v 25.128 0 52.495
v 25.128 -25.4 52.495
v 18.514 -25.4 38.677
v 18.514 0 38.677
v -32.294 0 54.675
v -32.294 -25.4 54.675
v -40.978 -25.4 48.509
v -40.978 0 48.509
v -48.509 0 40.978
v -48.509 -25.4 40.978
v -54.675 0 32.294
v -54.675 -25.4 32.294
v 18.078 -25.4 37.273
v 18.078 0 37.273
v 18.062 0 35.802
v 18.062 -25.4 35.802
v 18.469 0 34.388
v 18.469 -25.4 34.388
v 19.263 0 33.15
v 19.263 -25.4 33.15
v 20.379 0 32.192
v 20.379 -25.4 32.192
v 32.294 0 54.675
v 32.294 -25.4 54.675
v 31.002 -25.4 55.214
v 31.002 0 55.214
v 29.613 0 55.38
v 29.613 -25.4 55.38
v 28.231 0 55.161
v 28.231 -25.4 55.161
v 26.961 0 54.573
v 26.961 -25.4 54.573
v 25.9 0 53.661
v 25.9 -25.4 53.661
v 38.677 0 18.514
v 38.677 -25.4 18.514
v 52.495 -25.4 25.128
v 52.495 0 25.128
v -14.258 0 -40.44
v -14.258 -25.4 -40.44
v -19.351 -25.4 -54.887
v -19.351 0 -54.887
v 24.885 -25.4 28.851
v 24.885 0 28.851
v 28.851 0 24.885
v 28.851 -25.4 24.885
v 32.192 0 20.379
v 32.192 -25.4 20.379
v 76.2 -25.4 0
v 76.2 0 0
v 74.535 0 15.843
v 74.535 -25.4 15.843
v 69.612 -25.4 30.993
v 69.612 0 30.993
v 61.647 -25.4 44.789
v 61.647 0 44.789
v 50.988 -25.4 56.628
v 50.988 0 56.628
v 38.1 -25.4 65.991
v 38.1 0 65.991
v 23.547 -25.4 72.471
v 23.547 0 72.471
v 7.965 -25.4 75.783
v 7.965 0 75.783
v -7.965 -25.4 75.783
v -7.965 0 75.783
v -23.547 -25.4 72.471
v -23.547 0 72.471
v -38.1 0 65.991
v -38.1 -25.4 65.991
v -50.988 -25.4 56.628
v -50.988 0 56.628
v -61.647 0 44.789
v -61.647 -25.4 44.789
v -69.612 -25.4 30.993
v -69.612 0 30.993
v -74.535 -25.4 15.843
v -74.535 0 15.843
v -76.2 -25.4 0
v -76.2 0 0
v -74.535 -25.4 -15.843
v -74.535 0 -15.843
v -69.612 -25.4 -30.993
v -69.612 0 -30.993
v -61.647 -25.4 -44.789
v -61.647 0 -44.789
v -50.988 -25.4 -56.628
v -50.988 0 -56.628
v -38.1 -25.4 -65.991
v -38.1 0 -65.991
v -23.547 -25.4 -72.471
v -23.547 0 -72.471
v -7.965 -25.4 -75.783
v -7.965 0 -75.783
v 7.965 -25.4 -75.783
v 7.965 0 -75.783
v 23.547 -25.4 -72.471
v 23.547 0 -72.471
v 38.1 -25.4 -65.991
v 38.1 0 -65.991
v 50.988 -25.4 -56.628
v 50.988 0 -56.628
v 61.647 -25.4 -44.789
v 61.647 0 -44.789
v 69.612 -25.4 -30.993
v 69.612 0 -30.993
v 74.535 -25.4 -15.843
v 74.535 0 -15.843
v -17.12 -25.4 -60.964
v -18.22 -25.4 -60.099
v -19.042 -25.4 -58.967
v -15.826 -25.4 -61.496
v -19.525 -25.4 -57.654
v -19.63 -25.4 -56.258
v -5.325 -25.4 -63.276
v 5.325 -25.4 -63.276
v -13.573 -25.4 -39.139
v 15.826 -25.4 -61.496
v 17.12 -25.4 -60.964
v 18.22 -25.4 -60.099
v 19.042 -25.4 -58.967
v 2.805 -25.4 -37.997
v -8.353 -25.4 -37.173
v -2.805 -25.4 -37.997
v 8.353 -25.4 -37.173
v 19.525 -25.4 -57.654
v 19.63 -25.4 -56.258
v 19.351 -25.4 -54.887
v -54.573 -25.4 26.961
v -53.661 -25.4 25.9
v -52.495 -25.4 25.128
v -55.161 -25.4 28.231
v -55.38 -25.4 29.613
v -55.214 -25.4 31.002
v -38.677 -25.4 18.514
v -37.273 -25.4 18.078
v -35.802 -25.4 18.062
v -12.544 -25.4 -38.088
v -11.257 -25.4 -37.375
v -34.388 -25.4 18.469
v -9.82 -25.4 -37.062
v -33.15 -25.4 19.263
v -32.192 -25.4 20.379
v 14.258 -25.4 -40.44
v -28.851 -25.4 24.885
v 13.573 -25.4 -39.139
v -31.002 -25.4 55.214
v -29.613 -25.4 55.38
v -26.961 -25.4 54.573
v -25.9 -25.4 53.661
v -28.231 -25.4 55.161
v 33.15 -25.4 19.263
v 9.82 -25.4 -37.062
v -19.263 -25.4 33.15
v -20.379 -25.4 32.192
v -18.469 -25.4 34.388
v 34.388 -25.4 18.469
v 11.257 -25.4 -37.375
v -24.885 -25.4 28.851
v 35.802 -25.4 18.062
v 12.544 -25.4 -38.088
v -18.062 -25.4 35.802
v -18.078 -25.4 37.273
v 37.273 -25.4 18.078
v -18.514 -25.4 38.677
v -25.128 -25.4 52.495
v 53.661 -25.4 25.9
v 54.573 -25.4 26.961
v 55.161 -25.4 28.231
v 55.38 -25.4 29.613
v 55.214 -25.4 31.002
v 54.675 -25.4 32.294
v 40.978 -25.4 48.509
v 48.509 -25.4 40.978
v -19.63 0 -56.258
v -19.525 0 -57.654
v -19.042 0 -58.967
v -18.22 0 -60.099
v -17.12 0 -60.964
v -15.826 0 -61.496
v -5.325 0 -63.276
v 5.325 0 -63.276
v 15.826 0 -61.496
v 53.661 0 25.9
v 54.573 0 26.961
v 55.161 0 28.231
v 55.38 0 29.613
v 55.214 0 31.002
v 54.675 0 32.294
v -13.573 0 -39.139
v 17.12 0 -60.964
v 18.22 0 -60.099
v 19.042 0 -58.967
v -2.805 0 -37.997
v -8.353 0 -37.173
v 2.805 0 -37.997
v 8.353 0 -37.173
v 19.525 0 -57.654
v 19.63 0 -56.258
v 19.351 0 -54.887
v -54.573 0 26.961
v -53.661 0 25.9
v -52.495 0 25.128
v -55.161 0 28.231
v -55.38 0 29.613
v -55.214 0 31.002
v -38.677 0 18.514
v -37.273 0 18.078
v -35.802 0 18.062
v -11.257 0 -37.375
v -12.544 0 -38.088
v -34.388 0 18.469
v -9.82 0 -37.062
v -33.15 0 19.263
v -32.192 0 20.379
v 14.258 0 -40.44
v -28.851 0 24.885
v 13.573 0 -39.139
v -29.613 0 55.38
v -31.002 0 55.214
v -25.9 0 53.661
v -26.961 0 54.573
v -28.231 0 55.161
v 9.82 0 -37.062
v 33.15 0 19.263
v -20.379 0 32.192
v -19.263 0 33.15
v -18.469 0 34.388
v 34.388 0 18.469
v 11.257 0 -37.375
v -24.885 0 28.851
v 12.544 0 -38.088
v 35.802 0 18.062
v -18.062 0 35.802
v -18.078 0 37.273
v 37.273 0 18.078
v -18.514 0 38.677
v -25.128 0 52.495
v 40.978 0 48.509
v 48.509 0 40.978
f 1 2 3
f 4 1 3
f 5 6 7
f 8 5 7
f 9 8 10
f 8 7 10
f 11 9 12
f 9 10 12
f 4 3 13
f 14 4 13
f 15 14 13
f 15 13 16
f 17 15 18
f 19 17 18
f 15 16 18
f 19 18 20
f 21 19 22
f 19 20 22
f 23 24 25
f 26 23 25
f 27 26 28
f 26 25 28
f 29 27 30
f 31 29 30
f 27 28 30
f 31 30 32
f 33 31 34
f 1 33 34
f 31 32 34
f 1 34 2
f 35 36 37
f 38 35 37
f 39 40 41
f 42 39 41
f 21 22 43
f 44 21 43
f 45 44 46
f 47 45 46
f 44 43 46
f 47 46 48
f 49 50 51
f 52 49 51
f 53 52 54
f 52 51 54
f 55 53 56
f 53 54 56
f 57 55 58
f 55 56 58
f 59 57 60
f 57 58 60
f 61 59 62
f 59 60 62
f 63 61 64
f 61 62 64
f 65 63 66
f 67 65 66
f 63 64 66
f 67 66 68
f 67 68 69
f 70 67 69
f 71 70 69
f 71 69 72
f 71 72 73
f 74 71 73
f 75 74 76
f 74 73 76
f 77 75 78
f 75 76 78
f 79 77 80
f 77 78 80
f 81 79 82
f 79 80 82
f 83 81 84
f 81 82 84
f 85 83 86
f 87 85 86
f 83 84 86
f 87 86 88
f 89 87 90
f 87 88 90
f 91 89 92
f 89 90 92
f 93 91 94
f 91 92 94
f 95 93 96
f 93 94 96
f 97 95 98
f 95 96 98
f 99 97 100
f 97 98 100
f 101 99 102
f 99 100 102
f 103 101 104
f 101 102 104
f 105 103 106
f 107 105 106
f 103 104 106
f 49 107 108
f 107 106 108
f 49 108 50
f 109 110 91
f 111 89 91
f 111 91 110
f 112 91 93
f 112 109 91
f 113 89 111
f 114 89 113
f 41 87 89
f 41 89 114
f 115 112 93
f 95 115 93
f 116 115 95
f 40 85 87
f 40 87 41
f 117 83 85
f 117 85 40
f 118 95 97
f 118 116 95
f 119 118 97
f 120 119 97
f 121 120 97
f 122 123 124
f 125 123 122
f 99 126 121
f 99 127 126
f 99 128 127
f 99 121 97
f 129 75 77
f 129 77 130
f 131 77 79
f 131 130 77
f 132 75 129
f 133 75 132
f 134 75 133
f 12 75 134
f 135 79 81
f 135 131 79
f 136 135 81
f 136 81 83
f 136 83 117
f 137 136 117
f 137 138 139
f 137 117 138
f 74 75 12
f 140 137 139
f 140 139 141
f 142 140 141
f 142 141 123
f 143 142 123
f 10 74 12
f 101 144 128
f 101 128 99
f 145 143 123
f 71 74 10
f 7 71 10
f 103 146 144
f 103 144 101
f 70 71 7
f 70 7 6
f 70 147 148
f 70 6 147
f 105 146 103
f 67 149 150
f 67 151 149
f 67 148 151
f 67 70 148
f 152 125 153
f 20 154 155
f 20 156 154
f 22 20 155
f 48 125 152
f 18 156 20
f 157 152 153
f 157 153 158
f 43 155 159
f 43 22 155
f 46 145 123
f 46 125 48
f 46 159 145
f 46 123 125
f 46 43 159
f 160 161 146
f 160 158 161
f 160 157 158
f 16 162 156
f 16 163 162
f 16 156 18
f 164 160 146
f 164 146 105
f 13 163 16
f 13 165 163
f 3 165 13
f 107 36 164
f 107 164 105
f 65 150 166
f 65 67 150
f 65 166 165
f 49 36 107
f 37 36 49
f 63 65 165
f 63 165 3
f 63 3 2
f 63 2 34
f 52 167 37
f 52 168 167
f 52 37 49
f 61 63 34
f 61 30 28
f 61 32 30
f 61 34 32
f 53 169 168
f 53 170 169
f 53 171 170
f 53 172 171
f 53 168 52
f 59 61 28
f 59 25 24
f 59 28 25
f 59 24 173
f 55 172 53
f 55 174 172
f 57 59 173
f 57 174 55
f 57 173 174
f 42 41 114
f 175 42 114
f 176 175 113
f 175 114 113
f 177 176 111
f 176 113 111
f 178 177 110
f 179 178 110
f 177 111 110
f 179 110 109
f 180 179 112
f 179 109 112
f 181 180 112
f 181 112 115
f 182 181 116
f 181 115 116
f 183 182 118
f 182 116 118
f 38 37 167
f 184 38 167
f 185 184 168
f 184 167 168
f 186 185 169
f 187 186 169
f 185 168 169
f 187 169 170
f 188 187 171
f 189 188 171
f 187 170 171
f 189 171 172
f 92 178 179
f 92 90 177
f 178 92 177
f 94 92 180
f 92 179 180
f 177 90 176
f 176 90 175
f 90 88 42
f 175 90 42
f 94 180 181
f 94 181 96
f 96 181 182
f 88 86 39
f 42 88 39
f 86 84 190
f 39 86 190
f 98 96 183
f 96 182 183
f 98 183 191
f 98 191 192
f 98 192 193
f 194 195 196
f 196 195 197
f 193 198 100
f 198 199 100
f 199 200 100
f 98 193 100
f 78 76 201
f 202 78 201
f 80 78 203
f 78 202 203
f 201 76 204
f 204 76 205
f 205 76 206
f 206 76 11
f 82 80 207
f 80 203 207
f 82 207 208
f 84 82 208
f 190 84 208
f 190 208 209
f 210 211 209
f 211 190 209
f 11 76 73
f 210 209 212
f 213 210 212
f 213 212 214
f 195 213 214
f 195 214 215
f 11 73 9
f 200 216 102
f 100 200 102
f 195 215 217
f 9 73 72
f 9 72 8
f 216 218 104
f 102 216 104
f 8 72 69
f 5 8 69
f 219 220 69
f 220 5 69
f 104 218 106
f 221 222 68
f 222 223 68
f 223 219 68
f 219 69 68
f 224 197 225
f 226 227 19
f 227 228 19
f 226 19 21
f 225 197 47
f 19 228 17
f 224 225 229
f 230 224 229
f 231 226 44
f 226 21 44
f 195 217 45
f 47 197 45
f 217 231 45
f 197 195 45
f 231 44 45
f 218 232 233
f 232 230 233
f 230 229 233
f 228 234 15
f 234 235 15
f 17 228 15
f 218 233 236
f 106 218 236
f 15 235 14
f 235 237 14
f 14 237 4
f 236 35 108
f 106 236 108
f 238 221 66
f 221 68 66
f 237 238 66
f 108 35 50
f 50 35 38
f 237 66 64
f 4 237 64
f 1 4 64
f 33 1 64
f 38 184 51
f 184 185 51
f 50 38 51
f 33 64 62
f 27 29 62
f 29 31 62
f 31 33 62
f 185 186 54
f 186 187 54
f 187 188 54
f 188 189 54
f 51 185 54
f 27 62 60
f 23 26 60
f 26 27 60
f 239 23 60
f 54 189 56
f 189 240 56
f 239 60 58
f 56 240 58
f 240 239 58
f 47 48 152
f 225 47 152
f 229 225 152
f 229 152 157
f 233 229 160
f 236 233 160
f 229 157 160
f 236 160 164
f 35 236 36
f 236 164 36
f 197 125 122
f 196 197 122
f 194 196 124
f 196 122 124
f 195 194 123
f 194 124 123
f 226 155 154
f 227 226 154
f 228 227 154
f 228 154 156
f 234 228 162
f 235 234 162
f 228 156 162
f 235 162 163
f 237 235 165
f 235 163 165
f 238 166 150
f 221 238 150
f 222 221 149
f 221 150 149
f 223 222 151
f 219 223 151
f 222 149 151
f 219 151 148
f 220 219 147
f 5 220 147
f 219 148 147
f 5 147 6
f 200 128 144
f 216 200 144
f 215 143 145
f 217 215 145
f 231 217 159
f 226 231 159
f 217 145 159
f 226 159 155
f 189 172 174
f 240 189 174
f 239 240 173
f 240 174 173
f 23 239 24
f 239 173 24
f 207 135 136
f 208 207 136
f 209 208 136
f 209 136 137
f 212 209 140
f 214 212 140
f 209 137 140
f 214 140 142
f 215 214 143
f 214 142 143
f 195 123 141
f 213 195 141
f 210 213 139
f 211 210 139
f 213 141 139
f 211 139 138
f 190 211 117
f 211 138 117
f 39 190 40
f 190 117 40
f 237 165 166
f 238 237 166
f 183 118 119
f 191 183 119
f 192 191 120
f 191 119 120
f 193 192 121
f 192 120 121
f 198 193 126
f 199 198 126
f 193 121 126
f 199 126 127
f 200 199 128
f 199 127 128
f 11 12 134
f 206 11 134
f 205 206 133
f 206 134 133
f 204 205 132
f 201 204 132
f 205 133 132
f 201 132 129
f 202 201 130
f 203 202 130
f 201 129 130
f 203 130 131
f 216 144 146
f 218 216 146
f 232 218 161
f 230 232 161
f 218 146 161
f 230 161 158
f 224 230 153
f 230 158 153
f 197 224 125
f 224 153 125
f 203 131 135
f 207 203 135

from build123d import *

# Parameters (mm, degrees)
F0_R     = 76.2
F1_DEPTH = 25.4
F3_DEPTH = 25.4


with BuildPart() as f1:
    # F0 (on Front) → F1 (new body)
    with BuildSketch(Plane.XZ):
        Circle(F0_R)
    extrude(amount=F1_DEPTH)

    # F2 (on face) → F3 (cut)
    with BuildSketch(Plane.XZ.offset(25.4)):
        with BuildLine():
            Line((-52.494522, 25.127975), (-38.677355, 18.514))
            ThreePointArc((-38.677355, 18.514), (-35.080153, 18.213926), (-32.19177, 20.37891))
            ThreePointArc((-32.19177, 20.37891), (-26.940768, 26.940768), (-20.37891, 32.19177))
            ThreePointArc((-20.37891, 32.19177), (-18.213926, 35.080153), (-18.514, 38.677355))
            Line((-18.514, 38.677355), (-25.127975, 52.494522))
            ThreePointArc((-25.127975, 52.494522), (-28.231073, 55.161107), (-32.293557, 54.675188))
            ThreePointArc((-32.293557, 54.675188), (-44.901281, 44.901281), (-54.675188, 32.293557))
            ThreePointArc((-54.675188, 32.293557), (-55.161107, 28.231073), (-52.494522, 25.127975))
        make_face()
        with BuildLine():
            Line((19.351072, -54.887394), (14.257645, -40.440395))
            ThreePointArc((14.257645, -40.440395), (11.926223, -37.684605), (8.352953, -37.173084))
            ThreePointArc((8.352953, -37.173084), (0, -38.1), (-8.352953, -37.173084))
            ThreePointArc((-8.352953, -37.173084), (-11.926223, -37.684605), (-14.257645, -40.440395))
            Line((-14.257645, -40.440395), (-19.351072, -54.887394))
            ThreePointArc((-19.351072, -54.887394), (-19.04241, -58.967176), (-15.826203, -61.496189))
            ThreePointArc((-15.826203, -61.496189), (0, -63.5), (15.826203, -61.496189))
            ThreePointArc((15.826203, -61.496189), (19.04241, -58.967176), (19.351072, -54.887394))
        make_face()
        with BuildLine():
            Line((25.127975, 52.494522), (18.514, 38.677355))
            ThreePointArc((18.514, 38.677355), (18.213926, 35.080153), (20.37891, 32.19177))
            ThreePointArc((20.37891, 32.19177), (26.940768, 26.940768), (32.19177, 20.37891))
            ThreePointArc((32.19177, 20.37891), (35.080153, 18.213926), (38.677355, 18.514))
            Line((38.677355, 18.514), (52.494522, 25.127975))
            ThreePointArc((52.494522, 25.127975), (55.161107, 28.231073), (54.675188, 32.293557))
            ThreePointArc((54.675188, 32.293557), (44.901281, 44.901281), (32.293557, 54.675188))
            ThreePointArc((32.293557, 54.675188), (28.231073, 55.161107), (25.127975, 52.494522))
        make_face()
    extrude(amount=-F3_DEPTH, mode=Mode.SUBTRACT)


solid = f1.part
